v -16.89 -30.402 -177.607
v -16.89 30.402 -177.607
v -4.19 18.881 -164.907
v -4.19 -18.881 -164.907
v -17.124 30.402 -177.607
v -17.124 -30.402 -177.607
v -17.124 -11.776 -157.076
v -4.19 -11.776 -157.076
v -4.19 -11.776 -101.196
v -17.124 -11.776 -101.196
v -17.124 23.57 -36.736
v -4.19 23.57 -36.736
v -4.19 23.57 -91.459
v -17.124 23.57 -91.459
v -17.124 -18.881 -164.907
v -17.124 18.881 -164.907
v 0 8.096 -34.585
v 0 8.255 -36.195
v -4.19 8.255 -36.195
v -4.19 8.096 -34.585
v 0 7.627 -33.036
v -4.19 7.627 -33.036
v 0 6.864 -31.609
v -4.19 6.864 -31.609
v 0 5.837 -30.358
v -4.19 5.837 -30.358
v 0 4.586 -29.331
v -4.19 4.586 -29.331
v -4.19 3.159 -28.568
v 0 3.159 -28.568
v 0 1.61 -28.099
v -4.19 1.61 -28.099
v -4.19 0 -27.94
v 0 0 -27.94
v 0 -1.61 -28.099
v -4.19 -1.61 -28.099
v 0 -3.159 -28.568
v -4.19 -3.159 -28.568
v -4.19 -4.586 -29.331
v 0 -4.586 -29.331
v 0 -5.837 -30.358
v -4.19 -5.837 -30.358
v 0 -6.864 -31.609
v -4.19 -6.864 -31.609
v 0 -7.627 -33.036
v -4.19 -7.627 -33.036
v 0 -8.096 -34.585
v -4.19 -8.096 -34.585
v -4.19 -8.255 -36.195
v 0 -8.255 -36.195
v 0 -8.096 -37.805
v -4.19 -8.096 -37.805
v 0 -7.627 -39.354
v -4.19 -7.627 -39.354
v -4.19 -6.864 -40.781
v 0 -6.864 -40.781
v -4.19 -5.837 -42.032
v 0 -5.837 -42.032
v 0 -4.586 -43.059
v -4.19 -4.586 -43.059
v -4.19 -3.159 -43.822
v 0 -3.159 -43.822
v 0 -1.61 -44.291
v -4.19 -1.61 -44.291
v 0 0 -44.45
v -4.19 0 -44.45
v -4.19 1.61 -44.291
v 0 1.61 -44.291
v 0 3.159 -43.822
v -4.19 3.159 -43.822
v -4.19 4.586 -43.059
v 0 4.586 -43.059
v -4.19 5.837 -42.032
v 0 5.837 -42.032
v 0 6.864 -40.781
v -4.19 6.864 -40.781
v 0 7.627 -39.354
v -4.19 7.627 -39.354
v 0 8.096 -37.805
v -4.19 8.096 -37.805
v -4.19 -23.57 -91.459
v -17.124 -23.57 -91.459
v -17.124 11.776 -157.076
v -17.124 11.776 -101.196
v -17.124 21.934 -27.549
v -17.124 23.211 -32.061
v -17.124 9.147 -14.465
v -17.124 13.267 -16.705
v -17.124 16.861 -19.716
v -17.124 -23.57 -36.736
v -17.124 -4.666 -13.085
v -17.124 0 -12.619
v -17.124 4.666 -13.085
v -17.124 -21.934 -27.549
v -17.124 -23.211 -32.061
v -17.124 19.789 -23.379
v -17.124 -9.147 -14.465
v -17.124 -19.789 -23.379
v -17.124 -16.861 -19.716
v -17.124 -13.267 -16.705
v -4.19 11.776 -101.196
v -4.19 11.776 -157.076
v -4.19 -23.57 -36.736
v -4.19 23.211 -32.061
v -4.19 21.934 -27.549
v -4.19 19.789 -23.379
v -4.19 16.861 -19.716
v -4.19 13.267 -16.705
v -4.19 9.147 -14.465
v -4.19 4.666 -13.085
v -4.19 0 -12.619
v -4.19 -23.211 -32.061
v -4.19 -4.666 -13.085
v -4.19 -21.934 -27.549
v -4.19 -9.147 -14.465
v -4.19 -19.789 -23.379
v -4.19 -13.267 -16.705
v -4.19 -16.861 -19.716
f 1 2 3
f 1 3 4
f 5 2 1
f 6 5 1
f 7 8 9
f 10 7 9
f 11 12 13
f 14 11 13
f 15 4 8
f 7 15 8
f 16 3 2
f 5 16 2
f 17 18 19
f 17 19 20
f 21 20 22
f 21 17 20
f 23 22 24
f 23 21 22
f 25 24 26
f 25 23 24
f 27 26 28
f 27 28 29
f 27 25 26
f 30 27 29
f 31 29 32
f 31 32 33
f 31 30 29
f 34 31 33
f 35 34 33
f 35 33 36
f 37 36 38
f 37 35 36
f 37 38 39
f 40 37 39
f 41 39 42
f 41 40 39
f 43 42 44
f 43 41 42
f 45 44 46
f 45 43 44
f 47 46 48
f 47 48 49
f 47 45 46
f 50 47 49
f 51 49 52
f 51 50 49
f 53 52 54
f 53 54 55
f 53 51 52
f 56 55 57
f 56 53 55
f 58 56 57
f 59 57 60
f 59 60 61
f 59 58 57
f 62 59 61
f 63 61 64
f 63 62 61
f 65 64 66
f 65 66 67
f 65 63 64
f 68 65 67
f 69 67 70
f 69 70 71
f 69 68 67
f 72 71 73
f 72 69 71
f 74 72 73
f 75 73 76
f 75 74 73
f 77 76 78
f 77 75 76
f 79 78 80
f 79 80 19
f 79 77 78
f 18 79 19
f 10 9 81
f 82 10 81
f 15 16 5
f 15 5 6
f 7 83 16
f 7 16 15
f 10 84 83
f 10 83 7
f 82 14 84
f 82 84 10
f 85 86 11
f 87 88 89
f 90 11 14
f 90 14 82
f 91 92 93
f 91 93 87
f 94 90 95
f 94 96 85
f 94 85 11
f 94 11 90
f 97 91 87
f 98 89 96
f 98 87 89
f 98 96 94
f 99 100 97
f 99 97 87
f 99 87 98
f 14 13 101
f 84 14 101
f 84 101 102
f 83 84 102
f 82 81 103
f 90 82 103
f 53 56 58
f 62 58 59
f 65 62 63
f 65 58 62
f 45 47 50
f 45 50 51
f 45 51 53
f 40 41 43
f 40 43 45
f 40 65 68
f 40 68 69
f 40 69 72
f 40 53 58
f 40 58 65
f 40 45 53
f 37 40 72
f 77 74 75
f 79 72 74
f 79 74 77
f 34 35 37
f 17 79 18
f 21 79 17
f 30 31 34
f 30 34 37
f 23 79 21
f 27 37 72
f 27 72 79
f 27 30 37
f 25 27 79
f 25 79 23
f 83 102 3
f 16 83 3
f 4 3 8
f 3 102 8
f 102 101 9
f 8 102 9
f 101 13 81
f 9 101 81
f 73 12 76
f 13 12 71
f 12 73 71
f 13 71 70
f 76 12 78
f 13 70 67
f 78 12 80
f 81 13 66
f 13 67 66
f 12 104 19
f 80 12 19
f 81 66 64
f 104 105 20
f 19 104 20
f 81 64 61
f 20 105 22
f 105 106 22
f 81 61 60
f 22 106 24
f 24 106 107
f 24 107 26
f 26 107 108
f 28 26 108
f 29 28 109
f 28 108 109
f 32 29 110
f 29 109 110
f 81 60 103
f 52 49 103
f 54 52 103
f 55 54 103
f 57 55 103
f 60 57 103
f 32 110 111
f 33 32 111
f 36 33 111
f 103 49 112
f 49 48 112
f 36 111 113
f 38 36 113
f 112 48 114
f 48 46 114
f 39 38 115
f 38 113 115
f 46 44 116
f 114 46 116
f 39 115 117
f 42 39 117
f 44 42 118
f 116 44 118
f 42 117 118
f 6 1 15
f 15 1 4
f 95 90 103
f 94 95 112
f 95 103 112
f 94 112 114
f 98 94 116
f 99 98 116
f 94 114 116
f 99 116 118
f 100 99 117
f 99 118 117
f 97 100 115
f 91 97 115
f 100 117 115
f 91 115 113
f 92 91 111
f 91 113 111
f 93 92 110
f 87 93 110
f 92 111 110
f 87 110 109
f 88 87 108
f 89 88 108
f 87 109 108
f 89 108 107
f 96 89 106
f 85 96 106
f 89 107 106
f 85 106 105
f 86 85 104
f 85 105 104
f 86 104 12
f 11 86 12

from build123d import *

# Parameters (mm, degrees)
F0_R     = 8.255
F1_DEPTH = 4.189812
F3_DEPTH = 12.934547
F4_SIZE  = 12.7


with BuildPart() as f1:
    # F0 (on Right) → F1 (new body)
    with BuildSketch(Plane.YZ):
        with Locations((0, -36.195)):
            Circle(F0_R)
    extrude(amount=-F1_DEPTH)

    # F2 (on face) → F3 (join)
    with BuildSketch(Plane(origin=(-4.189812, 0, 0), x_dir=(0, -1, 0), z_dir=(-1, 0, 0))):
        with BuildLine():
            ThreePointArc((23.570169, -36.736008), (0, -12.618623), (-23.570169, -36.736008))
            Line((-23.570169, -36.736008), (-23.570169, -91.458903))
            Line((-23.570169, -91.458903), (-11.775727, -101.195575))
            Line((-11.775727, -101.195575), (-11.775727, -157.075575))
            Line((-11.775727, -157.075575), (-18.880744, -164.907241))
            Line((-18.880744, -164.907241), (-30.402395, -177.607241))
            Line((-30.402395, -177.607241), (30.402395, -177.607241))
            Line((30.402395, -177.607241), (18.880744, -164.907241))
            Line((18.880744, -164.907241), (11.775727, -157.075575))
            Line((11.775727, -157.075575), (11.775727, -101.195575))
            Line((11.775727, -101.195575), (23.570169, -91.458903))
            Line((23.570169, -91.458903), (23.570169, -36.736008))
        make_face()
    extrude(amount=F3_DEPTH)

    # F4
    f4_edges = [f1.edges().sort_by_distance(p)[0] for p in [
        (-4.189812, 0, -177.607241),
    ]]
    chamfer(f4_edges, length=F4_SIZE)


solid = f1.part
